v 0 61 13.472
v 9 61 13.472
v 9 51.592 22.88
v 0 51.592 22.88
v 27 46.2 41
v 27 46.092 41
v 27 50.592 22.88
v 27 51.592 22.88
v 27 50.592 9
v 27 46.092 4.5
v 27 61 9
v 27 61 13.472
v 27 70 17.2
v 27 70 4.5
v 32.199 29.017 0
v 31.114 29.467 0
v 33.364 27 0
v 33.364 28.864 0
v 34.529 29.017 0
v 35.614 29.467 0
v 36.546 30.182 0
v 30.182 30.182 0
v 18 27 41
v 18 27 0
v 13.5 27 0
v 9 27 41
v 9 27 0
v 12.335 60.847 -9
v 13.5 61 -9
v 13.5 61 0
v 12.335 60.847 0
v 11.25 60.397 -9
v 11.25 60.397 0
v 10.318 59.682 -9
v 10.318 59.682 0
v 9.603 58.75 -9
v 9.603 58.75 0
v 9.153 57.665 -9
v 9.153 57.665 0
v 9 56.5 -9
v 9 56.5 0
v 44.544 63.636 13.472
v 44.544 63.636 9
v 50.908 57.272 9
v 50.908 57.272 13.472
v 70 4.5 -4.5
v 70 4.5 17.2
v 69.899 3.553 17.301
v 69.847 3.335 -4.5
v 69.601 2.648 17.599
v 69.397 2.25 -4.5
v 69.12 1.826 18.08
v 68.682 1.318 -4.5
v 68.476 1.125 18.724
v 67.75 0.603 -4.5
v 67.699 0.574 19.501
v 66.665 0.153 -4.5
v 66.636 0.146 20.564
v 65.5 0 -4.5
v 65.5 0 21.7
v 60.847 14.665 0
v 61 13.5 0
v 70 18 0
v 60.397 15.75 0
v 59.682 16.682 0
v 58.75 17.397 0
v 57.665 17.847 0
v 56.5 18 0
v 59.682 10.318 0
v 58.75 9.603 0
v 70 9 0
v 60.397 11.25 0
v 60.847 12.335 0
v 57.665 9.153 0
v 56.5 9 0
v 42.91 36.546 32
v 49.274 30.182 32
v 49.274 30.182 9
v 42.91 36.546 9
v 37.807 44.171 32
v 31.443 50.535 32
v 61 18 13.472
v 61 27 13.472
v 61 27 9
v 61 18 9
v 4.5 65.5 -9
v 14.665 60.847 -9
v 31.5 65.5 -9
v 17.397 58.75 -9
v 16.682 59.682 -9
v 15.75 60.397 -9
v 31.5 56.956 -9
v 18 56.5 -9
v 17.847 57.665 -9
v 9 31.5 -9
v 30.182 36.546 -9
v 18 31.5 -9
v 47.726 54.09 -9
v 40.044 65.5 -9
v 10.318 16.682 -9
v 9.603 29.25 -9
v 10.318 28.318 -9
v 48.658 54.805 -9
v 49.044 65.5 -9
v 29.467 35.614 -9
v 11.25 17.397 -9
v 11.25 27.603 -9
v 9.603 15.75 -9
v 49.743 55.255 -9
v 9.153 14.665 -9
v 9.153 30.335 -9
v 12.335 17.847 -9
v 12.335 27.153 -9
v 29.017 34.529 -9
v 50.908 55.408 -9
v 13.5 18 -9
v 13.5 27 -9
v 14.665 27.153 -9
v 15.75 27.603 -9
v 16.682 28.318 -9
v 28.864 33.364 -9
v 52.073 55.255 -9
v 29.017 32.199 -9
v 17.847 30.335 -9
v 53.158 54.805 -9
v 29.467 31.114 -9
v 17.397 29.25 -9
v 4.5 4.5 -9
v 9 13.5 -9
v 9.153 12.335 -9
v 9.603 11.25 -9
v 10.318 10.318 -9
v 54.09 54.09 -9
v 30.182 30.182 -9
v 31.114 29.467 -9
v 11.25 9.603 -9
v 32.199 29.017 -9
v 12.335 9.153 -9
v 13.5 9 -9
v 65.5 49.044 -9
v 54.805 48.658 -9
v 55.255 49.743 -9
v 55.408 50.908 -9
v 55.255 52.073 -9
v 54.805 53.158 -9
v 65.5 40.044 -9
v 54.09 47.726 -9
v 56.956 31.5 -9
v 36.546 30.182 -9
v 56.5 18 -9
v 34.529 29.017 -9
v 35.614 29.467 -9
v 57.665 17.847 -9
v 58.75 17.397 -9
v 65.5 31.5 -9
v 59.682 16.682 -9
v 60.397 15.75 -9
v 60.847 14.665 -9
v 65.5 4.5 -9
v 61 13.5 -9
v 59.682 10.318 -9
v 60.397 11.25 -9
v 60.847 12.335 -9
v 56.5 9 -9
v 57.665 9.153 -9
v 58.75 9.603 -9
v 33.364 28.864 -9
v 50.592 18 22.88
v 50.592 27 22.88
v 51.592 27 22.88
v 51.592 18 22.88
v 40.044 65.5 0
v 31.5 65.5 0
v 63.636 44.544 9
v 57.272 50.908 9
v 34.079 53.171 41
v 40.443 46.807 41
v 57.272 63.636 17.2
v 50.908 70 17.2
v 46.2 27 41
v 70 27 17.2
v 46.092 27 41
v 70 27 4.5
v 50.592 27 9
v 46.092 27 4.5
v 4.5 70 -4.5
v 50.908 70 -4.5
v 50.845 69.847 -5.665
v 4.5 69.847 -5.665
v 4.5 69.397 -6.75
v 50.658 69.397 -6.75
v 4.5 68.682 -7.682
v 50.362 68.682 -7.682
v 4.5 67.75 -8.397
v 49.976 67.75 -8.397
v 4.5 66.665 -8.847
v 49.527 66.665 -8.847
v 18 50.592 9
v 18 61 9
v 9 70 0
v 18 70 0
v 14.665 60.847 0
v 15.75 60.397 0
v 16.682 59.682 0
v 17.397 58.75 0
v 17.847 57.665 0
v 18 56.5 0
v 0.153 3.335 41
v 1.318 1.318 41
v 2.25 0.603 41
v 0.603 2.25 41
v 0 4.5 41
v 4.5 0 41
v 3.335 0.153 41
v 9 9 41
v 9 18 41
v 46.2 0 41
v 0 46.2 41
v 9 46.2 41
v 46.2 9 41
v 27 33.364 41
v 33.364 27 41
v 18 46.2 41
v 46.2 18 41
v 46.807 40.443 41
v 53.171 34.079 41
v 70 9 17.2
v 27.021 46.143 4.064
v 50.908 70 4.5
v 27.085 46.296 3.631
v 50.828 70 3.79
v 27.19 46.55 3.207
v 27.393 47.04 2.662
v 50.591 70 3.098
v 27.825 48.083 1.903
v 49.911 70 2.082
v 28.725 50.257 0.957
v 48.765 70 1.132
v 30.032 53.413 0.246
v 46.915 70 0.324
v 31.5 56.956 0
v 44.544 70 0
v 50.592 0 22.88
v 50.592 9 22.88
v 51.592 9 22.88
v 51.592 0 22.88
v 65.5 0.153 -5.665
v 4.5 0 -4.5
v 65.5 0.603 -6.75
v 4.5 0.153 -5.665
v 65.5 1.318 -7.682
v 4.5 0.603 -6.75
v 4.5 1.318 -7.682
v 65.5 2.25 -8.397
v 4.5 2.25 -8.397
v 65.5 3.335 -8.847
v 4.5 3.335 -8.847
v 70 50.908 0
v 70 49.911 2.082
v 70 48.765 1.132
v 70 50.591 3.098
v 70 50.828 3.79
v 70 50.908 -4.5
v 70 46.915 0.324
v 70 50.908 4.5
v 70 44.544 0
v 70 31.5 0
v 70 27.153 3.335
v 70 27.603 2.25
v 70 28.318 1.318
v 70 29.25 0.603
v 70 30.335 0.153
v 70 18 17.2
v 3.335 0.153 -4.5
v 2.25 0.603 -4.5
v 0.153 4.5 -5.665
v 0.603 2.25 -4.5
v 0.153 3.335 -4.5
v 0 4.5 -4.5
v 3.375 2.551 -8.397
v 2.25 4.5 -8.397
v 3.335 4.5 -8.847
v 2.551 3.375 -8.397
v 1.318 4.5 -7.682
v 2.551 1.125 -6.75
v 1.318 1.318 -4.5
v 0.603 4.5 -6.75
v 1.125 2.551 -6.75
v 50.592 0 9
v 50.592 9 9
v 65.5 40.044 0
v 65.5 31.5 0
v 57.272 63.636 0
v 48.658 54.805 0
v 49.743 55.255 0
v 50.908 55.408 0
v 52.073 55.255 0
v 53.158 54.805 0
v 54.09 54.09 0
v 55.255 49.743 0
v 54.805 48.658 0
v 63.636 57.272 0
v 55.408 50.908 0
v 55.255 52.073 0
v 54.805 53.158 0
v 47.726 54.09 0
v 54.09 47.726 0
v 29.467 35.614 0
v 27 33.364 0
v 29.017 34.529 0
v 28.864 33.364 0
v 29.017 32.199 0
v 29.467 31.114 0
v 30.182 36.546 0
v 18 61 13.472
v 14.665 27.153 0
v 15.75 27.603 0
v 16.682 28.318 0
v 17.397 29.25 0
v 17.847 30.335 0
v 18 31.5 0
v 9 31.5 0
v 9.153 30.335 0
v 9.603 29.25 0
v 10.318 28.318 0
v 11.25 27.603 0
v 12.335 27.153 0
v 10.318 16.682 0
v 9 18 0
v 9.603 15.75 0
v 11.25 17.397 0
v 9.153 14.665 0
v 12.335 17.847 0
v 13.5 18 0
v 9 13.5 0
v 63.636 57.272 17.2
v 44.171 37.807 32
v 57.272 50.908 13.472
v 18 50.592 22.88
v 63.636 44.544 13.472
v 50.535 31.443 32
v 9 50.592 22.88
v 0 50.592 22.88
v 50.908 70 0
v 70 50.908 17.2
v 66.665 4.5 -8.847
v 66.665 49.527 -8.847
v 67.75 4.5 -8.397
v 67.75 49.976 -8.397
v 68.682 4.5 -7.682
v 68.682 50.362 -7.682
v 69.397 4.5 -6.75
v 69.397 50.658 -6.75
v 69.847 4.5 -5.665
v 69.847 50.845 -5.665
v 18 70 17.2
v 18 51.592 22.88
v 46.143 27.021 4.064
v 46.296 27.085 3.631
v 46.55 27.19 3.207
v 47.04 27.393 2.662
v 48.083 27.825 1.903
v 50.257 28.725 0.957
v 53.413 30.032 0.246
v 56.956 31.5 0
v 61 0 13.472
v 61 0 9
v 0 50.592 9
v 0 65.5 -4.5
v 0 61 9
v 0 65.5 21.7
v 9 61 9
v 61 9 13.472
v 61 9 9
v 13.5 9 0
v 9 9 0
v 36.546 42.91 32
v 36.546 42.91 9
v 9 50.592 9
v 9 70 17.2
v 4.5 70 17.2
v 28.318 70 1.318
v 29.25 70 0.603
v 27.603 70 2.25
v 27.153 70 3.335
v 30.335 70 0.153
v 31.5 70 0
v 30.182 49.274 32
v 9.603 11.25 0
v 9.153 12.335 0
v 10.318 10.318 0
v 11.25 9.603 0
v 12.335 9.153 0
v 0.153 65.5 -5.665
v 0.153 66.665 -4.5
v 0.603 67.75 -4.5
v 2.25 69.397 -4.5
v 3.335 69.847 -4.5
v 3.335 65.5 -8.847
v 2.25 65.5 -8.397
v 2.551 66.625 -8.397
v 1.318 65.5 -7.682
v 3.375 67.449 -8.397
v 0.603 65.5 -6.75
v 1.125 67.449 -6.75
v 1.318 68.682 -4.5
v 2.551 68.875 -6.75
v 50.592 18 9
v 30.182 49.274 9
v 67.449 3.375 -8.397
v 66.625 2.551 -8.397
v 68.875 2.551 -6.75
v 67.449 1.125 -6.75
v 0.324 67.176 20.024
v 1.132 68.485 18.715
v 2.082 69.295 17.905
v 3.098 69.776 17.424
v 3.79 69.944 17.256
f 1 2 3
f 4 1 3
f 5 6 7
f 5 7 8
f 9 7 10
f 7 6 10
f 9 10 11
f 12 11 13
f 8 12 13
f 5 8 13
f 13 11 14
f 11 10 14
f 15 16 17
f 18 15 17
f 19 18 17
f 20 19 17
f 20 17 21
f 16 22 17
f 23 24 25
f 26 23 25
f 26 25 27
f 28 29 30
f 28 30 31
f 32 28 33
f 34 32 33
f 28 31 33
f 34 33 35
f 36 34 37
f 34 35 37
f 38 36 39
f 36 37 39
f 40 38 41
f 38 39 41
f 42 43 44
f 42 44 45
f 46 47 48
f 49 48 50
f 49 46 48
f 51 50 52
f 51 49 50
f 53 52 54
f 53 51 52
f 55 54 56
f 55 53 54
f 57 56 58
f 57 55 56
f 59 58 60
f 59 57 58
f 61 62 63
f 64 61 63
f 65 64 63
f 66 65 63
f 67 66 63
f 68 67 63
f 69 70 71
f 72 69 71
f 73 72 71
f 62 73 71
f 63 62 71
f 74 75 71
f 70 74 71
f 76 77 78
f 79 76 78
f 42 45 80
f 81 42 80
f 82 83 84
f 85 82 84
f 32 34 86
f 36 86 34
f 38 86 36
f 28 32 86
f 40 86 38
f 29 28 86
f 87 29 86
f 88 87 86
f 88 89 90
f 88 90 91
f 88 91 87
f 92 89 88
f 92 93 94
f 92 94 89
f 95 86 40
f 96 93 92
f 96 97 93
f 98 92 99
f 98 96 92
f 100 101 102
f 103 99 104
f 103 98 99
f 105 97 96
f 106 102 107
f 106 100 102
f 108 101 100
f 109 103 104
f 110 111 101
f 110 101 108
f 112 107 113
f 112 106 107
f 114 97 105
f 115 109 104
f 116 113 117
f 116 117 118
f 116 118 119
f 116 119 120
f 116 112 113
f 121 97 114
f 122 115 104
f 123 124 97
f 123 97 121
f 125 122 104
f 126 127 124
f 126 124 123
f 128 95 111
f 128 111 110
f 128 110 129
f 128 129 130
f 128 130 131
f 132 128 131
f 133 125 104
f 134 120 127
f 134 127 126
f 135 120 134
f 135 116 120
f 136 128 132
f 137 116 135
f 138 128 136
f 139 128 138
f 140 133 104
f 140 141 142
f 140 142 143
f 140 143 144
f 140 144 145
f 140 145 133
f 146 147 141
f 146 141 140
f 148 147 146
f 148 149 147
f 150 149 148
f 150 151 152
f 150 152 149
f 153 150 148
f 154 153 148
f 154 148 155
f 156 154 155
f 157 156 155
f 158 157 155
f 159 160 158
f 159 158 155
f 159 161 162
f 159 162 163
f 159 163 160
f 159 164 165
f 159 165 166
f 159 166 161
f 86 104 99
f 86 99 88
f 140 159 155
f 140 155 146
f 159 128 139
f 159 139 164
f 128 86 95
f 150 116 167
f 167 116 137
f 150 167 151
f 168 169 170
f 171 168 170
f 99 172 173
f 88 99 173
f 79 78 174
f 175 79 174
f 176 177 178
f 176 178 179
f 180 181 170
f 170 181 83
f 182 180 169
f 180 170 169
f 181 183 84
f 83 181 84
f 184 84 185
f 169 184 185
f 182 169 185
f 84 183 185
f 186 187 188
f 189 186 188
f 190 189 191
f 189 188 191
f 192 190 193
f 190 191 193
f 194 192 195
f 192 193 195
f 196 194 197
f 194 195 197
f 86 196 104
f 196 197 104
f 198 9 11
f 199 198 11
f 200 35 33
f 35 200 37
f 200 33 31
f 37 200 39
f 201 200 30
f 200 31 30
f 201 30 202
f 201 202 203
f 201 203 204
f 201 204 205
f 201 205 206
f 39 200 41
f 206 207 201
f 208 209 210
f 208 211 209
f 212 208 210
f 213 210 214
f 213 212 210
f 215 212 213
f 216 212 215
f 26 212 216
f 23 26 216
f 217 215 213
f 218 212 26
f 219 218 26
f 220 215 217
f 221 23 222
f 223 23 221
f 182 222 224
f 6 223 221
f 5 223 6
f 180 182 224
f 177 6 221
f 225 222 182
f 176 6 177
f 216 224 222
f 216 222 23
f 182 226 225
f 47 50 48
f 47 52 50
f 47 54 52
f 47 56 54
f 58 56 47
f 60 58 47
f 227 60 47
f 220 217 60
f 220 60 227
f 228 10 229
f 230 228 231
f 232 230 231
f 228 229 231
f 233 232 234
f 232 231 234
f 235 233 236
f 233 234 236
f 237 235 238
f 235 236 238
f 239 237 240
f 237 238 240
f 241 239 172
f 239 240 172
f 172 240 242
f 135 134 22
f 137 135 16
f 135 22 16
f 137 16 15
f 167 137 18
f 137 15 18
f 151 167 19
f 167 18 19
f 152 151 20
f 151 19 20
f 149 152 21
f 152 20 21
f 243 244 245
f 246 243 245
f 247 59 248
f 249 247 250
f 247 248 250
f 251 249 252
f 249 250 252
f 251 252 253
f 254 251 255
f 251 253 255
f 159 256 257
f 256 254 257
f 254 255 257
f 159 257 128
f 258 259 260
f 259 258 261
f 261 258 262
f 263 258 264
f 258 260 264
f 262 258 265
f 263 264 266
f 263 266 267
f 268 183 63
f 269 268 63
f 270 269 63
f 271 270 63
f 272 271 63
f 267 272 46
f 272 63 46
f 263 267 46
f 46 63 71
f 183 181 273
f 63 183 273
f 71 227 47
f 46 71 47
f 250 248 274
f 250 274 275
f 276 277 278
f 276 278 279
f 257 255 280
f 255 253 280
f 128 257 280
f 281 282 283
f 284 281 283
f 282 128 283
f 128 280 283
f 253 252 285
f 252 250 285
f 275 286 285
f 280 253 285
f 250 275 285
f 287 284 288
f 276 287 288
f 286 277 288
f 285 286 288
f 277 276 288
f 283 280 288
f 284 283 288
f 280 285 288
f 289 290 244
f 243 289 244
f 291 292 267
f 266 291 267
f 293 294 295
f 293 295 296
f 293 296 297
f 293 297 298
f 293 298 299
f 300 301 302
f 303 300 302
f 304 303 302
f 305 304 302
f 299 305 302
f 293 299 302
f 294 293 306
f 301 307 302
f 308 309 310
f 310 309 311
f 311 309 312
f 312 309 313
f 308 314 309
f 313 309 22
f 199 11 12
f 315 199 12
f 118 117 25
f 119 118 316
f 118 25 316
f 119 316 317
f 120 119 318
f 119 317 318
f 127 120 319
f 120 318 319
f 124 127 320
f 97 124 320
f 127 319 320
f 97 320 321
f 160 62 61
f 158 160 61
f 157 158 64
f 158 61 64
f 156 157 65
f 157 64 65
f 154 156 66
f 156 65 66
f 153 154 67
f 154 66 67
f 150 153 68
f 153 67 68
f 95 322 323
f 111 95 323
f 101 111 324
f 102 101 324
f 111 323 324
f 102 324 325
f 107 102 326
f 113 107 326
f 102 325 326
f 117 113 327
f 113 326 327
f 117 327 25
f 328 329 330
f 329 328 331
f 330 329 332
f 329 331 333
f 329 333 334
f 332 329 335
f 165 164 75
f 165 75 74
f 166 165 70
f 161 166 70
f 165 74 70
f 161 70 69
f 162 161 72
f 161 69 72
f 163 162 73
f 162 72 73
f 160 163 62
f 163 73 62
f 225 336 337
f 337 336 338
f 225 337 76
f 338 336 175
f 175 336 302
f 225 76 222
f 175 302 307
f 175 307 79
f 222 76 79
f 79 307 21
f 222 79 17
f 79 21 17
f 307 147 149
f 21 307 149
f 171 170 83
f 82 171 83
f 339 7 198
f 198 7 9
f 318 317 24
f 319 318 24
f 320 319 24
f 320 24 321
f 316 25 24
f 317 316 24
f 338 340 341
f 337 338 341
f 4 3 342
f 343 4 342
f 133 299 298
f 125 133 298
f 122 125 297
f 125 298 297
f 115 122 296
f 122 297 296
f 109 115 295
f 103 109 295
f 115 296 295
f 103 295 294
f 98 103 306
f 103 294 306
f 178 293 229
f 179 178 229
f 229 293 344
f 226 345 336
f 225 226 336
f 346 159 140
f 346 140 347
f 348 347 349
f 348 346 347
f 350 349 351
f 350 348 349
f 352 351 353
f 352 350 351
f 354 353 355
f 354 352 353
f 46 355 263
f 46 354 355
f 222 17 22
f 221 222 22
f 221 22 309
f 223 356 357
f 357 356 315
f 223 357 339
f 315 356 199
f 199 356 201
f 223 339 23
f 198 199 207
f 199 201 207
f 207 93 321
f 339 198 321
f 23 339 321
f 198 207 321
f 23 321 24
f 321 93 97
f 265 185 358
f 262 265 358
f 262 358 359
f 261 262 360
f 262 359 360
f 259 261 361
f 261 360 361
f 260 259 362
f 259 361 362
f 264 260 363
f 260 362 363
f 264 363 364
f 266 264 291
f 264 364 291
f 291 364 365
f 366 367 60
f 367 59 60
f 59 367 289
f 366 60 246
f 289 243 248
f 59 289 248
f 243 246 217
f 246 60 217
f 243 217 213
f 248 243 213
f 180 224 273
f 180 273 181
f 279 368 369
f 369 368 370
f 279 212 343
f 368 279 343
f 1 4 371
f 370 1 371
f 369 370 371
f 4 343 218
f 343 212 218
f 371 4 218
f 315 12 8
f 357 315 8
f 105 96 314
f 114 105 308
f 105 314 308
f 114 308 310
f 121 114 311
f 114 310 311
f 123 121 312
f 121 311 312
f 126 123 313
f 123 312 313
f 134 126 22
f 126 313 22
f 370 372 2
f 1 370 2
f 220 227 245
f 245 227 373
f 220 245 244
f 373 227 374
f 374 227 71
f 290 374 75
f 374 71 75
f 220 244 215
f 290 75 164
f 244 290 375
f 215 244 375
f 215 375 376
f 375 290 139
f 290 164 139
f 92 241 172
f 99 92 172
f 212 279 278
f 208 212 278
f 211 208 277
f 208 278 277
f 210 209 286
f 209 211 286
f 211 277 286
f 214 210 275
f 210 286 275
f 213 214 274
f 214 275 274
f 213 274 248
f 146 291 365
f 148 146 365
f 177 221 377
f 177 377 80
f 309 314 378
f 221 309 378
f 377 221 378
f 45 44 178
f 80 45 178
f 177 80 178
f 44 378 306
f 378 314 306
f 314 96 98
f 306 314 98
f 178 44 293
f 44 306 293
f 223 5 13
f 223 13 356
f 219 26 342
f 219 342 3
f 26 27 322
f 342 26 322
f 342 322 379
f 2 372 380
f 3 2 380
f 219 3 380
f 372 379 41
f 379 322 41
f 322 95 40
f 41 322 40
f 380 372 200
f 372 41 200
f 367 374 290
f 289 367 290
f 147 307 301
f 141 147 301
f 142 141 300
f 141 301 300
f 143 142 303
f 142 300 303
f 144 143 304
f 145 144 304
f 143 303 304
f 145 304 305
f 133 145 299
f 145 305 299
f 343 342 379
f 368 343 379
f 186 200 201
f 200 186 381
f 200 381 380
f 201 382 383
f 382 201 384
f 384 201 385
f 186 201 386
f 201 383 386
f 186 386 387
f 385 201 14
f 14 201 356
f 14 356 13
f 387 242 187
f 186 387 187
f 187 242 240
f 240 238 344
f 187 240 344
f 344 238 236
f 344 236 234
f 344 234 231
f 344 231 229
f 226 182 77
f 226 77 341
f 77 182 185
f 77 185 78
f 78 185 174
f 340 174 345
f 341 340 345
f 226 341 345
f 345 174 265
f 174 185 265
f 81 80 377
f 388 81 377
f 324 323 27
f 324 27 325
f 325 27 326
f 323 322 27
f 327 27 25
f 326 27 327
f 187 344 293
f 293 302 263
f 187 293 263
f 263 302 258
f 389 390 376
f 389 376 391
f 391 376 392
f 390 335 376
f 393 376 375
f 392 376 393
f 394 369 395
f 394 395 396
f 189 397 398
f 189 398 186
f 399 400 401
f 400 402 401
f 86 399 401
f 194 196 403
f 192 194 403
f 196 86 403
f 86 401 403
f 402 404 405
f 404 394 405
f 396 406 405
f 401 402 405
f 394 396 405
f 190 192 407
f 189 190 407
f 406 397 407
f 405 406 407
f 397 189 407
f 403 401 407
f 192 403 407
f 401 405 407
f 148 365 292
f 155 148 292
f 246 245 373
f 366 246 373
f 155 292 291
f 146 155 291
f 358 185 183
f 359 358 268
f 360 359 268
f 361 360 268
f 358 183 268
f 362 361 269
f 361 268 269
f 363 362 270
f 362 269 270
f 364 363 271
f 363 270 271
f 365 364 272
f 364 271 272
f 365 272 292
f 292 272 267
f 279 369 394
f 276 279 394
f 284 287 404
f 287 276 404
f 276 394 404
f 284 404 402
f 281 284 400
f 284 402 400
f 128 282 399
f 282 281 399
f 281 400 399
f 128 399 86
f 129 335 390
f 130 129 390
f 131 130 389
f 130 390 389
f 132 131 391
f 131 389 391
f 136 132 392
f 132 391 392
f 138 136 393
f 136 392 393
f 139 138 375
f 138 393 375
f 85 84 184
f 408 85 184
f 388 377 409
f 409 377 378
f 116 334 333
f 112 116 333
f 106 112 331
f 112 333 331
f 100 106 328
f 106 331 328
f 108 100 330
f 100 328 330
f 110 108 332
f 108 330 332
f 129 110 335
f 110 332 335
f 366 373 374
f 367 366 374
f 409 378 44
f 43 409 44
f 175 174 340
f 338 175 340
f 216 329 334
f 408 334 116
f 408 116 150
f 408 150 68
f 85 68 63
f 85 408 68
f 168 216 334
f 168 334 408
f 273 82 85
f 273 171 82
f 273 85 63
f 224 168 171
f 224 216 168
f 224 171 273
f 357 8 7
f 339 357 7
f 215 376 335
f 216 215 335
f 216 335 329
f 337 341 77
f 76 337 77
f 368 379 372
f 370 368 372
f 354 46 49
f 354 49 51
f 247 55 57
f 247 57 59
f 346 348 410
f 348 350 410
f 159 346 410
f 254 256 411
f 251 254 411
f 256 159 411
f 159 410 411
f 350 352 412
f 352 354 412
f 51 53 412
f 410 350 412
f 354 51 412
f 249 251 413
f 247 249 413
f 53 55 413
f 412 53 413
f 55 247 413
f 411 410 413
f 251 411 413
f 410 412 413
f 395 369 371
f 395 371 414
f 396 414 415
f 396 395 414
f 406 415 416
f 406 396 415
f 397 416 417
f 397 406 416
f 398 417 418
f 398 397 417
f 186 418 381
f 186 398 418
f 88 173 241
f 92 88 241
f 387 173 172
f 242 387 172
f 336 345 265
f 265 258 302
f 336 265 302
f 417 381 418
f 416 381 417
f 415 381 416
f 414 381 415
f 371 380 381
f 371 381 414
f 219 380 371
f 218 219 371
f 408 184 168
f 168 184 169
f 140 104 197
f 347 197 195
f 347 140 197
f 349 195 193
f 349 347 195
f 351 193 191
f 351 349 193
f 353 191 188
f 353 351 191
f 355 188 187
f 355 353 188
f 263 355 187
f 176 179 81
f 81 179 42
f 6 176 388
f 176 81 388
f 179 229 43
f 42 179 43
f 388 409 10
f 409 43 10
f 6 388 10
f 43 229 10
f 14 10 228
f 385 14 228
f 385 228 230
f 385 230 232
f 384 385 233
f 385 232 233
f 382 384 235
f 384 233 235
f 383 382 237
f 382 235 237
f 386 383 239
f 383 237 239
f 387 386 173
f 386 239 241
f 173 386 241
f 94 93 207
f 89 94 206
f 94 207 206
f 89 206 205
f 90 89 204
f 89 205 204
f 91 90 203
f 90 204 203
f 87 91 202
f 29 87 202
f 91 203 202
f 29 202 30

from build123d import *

# Parameters (mm, degrees)
F1_DEPTH      = 41
F3_DEPTH      = 9
F4_SIZE       = 23.8
F5_SIZE       = 23.8
F7_DEPTH      = 9
F9_DEPTH      = 28.2
F11_DEPTH     = 34.5
F13_DEPTH     = 32.2
F14_R         = 4.49999
F15_T4_DEPTH  = 56.311183182
F15_T10_DEPTH = 35.158116908
F15_T15_DEPTH = 56.311183182
F15_T21_DEPTH = 35.158116908
F15_T23_DEPTH = 61.25
F15_T25_DEPTH = 37.45
F15_T28_ANGLE = 90
F15_T30_ANGLE = 90
F15_T32_ANGLE = 90


# Not quite as in the source:
# - a fillet or chamfer that OpenCascade refuses, or shapes differently, is made with other operations: its cross-section is extruded or revolved along the edge and cut away or added
# - a fillet or chamfer is up to 0.001 mm smaller than in the source, because OpenCascade refuses the exact size


with BuildPart() as f1:
    # F0 (on Top) → F1 (new body)
    with BuildSketch(Plane.XY):
        Polygon((0, 70), (0, 0), (70, 0), (70, 9), (9, 9), (9, 18), (70, 18), (70, 27), (46.091883092, 27), (70, 50.908116908), (63.6360389693, 57.2720779386), (33.3639610307, 27), (27, 33.3639610307), (57.2720779386, 63.6360389693), (50.908116908, 70), (27, 46.091883092), (27, 70), (18, 70), (18, 27), (9, 27), (9, 70), align=None)
    extrude(amount=F1_DEPTH)

    # F2 (on face) → F3 (join)
    with BuildSketch(Plane(origin=(0, 0, 0), x_dir=(1, 0, 0), z_dir=(0, 0, -1))):
        Polygon((70, -50.908116908), (70, 0), (0, 0), (0, -70), (50.908116908, -70), align=None)
    extrude(amount=F3_DEPTH)

    # F4
    f4_edges = [f1.edges().sort_by_distance(p)[0] for p in [
        (70, 4.5, 41),
        (70, 22.5, 41),
        (22.5, 70, 41),
        (4.5, 70, 41),
    ]]
    chamfer(f4_edges, length=F4_SIZE)

    # F5
    f5_edges = [f1.edges().sort_by_distance(p)[0] for p in [
        (66.818019, 54.090097, 41),
        (54.090097, 66.818019, 41),
    ]]
    chamfer(f5_edges, length=F5_SIZE)

    # F6 (on face) → F7 (cut, through all)
    with BuildSketch(Plane.XY):
        with BuildLine():
            Line((9, 56.5), (9, 31.5))
            ThreePointArc((9, 31.5), (10.3180194847, 28.3180194847), (13.5, 27))
            ThreePointArc((13.5, 27), (16.6819805153, 28.3180194847), (18, 31.5))
            Line((18, 31.5), (18, 56.5))
            ThreePointArc((18, 56.5), (16.6819805153, 59.6819805153), (13.5, 61))
            ThreePointArc((13.5, 61), (10.3180194847, 59.6819805153), (9, 56.5))
        make_face()
        with BuildLine():
            Line((56.5, 18), (13.5, 18))
            ThreePointArc((13.5, 18), (10.3180194847, 16.6819805153), (9, 13.5))
            ThreePointArc((9, 13.5), (10.3180194847, 10.3180194847), (13.5, 9))
            Line((13.5, 9), (56.5, 9))
            ThreePointArc((56.5, 9), (59.6819805153, 10.3180194847), (61, 13.5))
            ThreePointArc((61, 13.5), (59.6819805153, 16.6819805153), (56.5, 18))
        make_face()
        with BuildLine():
            Line((47.7261363926, 54.0900974233), (30.1819805153, 36.545941546))
            ThreePointArc((30.1819805153, 36.545941546), (28.8639610307, 33.3639610307), (30.1819805153, 30.1819805153))
            ThreePointArc((30.1819805153, 30.1819805153), (33.3639610307, 28.8639610307), (36.545941546, 30.1819805153))
            Line((36.545941546, 30.1819805153), (54.0900974233, 47.7261363926))
            ThreePointArc((54.0900974233, 47.7261363926), (55.408116908, 50.908116908), (54.0900974233, 54.0900974233))
            ThreePointArc((54.0900974233, 54.0900974233), (50.908116908, 55.408116908), (47.7261363926, 54.0900974233))
        make_face()
        Polygon((40.0441558773, 65.5), (31.5, 65.5), (31.5, 56.9558441227), align=None)
        Polygon((65.5, 40.0441558773), (56.9558441227, 31.5), (65.5, 31.5), align=None)
    extrude(amount=-F7_DEPTH, mode=Mode.SUBTRACT)

    # F8 (on face) → F9 (cut)
    with BuildSketch(Plane(origin=(9.545941546, -9.545941546, 0), x_dir=(0.7071067812, 0.7071067812, 0), z_dir=(0.7071067812, -0.7071067812, 0))):
        Polygon((56.1837661841, 32), (56.1837661841, 9), (76.4949493661, 9), (76.4949493661, 13.4720779386), (57.9670273048, 32), align=None)
    extrude(amount=-F9_DEPTH, mode=Mode.SUBTRACT)

    # F10 (on face) → F11 (cut)
    with BuildSketch(Plane.YZ.offset(27)):
        Polygon((50.591883092, 22.8801948466), (50.591883092, 9), (61, 9), (61, 13.4720779386), (51.591883092, 22.8801948466), align=None)
    extrude(amount=-F11_DEPTH, mode=Mode.SUBTRACT)

    # F12 (on face) → F13 (cut)
    with BuildSketch(Plane(origin=(0, 27, 0), x_dir=(-1, 0, 0), z_dir=(0, 1, 0))):
        Polygon((-61, 13.4720779386), (-61, 9), (-50.591883092, 9), (-50.591883092, 22.8801948466), (-51.591883092, 22.8801948466), align=None)
    extrude(amount=-F13_DEPTH, mode=Mode.SUBTRACT)

    # F14 (radius 4.5 in the source; OpenCascade refuses exactly that, so slightly less here)
    f14_edges = [f1.edges().sort_by_distance(p)[0] for p in [
        (35, 0, -9),
        (70, 25.454058, -9),
        (60.454058, 60.454058, -9),
        (25.454058, 70, -9),
        (0, 35, -9),
    ]]
    fillet(f14_edges, radius=F14_R)

    # F15: fillet of radius 4.5 on 7 edges, made by hand


with BuildPart() as f15_tool2:
    # F15_s3 → F15_t4 (new body)
    with BuildSketch(Plane(origin=(28.5909902577, 28.5909902577, 0), x_dir=(0, 0, 1), z_dir=(0.7071067812, 0.7071067812, 0))):
        with BuildLine():
            ThreePointArc((4.5, 13.5), (1.3180194847, 14.8180194847), (0, 18))
            Line((0, 18), (0, 13.5))
            Line((0, 13.5), (4.5, 13.5))
        make_face()
    extrude(amount=F15_T4_DEPTH)

    split(bisect_by=Plane.YZ.offset(70), keep=Keep.BOTTOM)

    split(bisect_by=Plane.XZ.offset(-18), keep=Keep.BOTTOM)


with BuildPart() as f1_1:
    add(f1.part)

    # F15_t1: union F15_tool2
    add(f15_tool2.part)


with BuildPart() as f15_tool8:
    # F15_s9 → F15_t10 (new body)
    with BuildSketch(Plane.YZ.offset(70)):
        with BuildLine():
            ThreePointArc((27, 4.5), (28.3180194847, 1.3180194847), (31.5, 0))
            Line((31.5, 0), (27, 0))
            Line((27, 0), (27, 4.5))
        make_face()
    extrude(amount=-F15_T10_DEPTH)

    split(bisect_by=Plane(origin=(9.545941546, -9.545941546, 0), x_dir=(0, 0, 1), z_dir=(0.7071067812, -0.7071067812, 0)), keep=Keep.TOP)


with BuildPart() as f1_2:
    add(f1_1.part)

    # F15_t7: union F15_tool8
    add(f15_tool8.part)


with BuildPart() as f15_tool13:
    # F15_s14 → F15_t15 (new body)
    with BuildSketch(Plane(origin=(68.4090097423, 68.4090097423, 0), x_dir=(0, 0, 1), z_dir=(-0.7071067812, -0.7071067812, 0))):
        with BuildLine():
            ThreePointArc((4.5, 13.5), (1.3180194847, 14.8180194847), (0, 18))
            Line((0, 18), (0, 13.5))
            Line((0, 13.5), (4.5, 13.5))
        make_face()
    extrude(amount=F15_T15_DEPTH)

    split(bisect_by=Plane.XZ.offset(-70), keep=Keep.TOP)

    split(bisect_by=Plane.YZ.offset(18), keep=Keep.TOP)


with BuildPart() as f1_3:
    add(f1_2.part)

    # F15_t12: union F15_tool13
    add(f15_tool13.part)


with BuildPart() as f15_tool19:
    # F15_s20 → F15_t21 (new body)
    with BuildSketch(Plane.XZ.offset(-34.841883092)):
        with BuildLine():
            ThreePointArc((27, 4.5), (28.3180194847, 1.3180194847), (31.5, 0))
            Line((31.5, 0), (27, 0))
            Line((27, 0), (27, 4.5))
        make_face()
    extrude(amount=-F15_T21_DEPTH)

    split(bisect_by=Plane(origin=(-3.1819805153, 3.1819805153, 0), x_dir=(0, 0, 1), z_dir=(-0.7071067812, 0.7071067812, 0)), keep=Keep.TOP)


with BuildPart() as f1_4:
    add(f1_3.part)

    # F15_t18: union F15_tool19
    add(f15_tool19.part)

    # F15_s24 → F15_t23 (cut)
    with BuildSketch(Plane.XY.offset(-9)):
        with BuildLine():
            ThreePointArc((0, 4.5), (1.3180194847, 1.3180194847), (4.5, 0))
            Line((4.5, 0), (0, 0))
            Line((0, 0), (0, 4.5))
        make_face()
    extrude(amount=F15_T23_DEPTH, mode=Mode.SUBTRACT)

    # F15_s26 → F15_t25 (cut)
    with BuildSketch(Plane.XY.offset(-9)):
        with BuildLine():
            ThreePointArc((70, 4.5), (68.6819805153, 1.3180194847), (65.5, 0))
            Line((65.5, 0), (70, 0))
            Line((70, 0), (70, 4.5))
        make_face()
        with BuildLine():
            ThreePointArc((0, 65.5), (1.3180194847, 68.6819805153), (4.5, 70))
            Line((4.5, 70), (0, 70))
            Line((0, 70), (0, 65.5))
        make_face()
    extrude(amount=F15_T25_DEPTH, mode=Mode.SUBTRACT)

    # F15_s27 → F15_t28 (revolve, cut)
    with BuildSketch(Plane.XZ.offset(-65.5)):
        with BuildLine():
            ThreePointArc((4.49999, -9), (1.3180165557, -7.6819834443), (0, -4.50001))
            Line((0, -4.50001), (0, -9))
            Line((0, -9), (4.49999, -9))
        make_face()
    revolve(axis=Axis((4.5, 65.5, -9), (0, 0, -1)), revolution_arc=F15_T28_ANGLE, mode=Mode.SUBTRACT)

    # F15_s29 → F15_t30 (revolve, cut)
    with BuildSketch(Plane.XZ.offset(-4.5)):
        with BuildLine():
            ThreePointArc((65.50001, -9), (68.6819834443, -7.6819834443), (70, -4.50001))
            Line((70, -4.50001), (70, -9))
            Line((70, -9), (65.50001, -9))
        make_face()
    revolve(axis=Axis((65.5, 4.5, -9), (0, 0, -1)), revolution_arc=F15_T30_ANGLE, mode=Mode.SUBTRACT)

    # F15_s31 → F15_t32 (revolve, cut)
    with BuildSketch(Plane.YZ.offset(4.5)):
        with BuildLine():
            ThreePointArc((4.49999, -9), (1.3180165557, -7.6819834443), (0, -4.50001))
            Line((0, -4.50001), (0, -9))
            Line((0, -9), (4.49999, -9))
        make_face()
    revolve(axis=Axis((4.5, 4.5, -9), (0, 0, -1)), revolution_arc=F15_T32_ANGLE, mode=Mode.SUBTRACT)


solid = f1_4.part
